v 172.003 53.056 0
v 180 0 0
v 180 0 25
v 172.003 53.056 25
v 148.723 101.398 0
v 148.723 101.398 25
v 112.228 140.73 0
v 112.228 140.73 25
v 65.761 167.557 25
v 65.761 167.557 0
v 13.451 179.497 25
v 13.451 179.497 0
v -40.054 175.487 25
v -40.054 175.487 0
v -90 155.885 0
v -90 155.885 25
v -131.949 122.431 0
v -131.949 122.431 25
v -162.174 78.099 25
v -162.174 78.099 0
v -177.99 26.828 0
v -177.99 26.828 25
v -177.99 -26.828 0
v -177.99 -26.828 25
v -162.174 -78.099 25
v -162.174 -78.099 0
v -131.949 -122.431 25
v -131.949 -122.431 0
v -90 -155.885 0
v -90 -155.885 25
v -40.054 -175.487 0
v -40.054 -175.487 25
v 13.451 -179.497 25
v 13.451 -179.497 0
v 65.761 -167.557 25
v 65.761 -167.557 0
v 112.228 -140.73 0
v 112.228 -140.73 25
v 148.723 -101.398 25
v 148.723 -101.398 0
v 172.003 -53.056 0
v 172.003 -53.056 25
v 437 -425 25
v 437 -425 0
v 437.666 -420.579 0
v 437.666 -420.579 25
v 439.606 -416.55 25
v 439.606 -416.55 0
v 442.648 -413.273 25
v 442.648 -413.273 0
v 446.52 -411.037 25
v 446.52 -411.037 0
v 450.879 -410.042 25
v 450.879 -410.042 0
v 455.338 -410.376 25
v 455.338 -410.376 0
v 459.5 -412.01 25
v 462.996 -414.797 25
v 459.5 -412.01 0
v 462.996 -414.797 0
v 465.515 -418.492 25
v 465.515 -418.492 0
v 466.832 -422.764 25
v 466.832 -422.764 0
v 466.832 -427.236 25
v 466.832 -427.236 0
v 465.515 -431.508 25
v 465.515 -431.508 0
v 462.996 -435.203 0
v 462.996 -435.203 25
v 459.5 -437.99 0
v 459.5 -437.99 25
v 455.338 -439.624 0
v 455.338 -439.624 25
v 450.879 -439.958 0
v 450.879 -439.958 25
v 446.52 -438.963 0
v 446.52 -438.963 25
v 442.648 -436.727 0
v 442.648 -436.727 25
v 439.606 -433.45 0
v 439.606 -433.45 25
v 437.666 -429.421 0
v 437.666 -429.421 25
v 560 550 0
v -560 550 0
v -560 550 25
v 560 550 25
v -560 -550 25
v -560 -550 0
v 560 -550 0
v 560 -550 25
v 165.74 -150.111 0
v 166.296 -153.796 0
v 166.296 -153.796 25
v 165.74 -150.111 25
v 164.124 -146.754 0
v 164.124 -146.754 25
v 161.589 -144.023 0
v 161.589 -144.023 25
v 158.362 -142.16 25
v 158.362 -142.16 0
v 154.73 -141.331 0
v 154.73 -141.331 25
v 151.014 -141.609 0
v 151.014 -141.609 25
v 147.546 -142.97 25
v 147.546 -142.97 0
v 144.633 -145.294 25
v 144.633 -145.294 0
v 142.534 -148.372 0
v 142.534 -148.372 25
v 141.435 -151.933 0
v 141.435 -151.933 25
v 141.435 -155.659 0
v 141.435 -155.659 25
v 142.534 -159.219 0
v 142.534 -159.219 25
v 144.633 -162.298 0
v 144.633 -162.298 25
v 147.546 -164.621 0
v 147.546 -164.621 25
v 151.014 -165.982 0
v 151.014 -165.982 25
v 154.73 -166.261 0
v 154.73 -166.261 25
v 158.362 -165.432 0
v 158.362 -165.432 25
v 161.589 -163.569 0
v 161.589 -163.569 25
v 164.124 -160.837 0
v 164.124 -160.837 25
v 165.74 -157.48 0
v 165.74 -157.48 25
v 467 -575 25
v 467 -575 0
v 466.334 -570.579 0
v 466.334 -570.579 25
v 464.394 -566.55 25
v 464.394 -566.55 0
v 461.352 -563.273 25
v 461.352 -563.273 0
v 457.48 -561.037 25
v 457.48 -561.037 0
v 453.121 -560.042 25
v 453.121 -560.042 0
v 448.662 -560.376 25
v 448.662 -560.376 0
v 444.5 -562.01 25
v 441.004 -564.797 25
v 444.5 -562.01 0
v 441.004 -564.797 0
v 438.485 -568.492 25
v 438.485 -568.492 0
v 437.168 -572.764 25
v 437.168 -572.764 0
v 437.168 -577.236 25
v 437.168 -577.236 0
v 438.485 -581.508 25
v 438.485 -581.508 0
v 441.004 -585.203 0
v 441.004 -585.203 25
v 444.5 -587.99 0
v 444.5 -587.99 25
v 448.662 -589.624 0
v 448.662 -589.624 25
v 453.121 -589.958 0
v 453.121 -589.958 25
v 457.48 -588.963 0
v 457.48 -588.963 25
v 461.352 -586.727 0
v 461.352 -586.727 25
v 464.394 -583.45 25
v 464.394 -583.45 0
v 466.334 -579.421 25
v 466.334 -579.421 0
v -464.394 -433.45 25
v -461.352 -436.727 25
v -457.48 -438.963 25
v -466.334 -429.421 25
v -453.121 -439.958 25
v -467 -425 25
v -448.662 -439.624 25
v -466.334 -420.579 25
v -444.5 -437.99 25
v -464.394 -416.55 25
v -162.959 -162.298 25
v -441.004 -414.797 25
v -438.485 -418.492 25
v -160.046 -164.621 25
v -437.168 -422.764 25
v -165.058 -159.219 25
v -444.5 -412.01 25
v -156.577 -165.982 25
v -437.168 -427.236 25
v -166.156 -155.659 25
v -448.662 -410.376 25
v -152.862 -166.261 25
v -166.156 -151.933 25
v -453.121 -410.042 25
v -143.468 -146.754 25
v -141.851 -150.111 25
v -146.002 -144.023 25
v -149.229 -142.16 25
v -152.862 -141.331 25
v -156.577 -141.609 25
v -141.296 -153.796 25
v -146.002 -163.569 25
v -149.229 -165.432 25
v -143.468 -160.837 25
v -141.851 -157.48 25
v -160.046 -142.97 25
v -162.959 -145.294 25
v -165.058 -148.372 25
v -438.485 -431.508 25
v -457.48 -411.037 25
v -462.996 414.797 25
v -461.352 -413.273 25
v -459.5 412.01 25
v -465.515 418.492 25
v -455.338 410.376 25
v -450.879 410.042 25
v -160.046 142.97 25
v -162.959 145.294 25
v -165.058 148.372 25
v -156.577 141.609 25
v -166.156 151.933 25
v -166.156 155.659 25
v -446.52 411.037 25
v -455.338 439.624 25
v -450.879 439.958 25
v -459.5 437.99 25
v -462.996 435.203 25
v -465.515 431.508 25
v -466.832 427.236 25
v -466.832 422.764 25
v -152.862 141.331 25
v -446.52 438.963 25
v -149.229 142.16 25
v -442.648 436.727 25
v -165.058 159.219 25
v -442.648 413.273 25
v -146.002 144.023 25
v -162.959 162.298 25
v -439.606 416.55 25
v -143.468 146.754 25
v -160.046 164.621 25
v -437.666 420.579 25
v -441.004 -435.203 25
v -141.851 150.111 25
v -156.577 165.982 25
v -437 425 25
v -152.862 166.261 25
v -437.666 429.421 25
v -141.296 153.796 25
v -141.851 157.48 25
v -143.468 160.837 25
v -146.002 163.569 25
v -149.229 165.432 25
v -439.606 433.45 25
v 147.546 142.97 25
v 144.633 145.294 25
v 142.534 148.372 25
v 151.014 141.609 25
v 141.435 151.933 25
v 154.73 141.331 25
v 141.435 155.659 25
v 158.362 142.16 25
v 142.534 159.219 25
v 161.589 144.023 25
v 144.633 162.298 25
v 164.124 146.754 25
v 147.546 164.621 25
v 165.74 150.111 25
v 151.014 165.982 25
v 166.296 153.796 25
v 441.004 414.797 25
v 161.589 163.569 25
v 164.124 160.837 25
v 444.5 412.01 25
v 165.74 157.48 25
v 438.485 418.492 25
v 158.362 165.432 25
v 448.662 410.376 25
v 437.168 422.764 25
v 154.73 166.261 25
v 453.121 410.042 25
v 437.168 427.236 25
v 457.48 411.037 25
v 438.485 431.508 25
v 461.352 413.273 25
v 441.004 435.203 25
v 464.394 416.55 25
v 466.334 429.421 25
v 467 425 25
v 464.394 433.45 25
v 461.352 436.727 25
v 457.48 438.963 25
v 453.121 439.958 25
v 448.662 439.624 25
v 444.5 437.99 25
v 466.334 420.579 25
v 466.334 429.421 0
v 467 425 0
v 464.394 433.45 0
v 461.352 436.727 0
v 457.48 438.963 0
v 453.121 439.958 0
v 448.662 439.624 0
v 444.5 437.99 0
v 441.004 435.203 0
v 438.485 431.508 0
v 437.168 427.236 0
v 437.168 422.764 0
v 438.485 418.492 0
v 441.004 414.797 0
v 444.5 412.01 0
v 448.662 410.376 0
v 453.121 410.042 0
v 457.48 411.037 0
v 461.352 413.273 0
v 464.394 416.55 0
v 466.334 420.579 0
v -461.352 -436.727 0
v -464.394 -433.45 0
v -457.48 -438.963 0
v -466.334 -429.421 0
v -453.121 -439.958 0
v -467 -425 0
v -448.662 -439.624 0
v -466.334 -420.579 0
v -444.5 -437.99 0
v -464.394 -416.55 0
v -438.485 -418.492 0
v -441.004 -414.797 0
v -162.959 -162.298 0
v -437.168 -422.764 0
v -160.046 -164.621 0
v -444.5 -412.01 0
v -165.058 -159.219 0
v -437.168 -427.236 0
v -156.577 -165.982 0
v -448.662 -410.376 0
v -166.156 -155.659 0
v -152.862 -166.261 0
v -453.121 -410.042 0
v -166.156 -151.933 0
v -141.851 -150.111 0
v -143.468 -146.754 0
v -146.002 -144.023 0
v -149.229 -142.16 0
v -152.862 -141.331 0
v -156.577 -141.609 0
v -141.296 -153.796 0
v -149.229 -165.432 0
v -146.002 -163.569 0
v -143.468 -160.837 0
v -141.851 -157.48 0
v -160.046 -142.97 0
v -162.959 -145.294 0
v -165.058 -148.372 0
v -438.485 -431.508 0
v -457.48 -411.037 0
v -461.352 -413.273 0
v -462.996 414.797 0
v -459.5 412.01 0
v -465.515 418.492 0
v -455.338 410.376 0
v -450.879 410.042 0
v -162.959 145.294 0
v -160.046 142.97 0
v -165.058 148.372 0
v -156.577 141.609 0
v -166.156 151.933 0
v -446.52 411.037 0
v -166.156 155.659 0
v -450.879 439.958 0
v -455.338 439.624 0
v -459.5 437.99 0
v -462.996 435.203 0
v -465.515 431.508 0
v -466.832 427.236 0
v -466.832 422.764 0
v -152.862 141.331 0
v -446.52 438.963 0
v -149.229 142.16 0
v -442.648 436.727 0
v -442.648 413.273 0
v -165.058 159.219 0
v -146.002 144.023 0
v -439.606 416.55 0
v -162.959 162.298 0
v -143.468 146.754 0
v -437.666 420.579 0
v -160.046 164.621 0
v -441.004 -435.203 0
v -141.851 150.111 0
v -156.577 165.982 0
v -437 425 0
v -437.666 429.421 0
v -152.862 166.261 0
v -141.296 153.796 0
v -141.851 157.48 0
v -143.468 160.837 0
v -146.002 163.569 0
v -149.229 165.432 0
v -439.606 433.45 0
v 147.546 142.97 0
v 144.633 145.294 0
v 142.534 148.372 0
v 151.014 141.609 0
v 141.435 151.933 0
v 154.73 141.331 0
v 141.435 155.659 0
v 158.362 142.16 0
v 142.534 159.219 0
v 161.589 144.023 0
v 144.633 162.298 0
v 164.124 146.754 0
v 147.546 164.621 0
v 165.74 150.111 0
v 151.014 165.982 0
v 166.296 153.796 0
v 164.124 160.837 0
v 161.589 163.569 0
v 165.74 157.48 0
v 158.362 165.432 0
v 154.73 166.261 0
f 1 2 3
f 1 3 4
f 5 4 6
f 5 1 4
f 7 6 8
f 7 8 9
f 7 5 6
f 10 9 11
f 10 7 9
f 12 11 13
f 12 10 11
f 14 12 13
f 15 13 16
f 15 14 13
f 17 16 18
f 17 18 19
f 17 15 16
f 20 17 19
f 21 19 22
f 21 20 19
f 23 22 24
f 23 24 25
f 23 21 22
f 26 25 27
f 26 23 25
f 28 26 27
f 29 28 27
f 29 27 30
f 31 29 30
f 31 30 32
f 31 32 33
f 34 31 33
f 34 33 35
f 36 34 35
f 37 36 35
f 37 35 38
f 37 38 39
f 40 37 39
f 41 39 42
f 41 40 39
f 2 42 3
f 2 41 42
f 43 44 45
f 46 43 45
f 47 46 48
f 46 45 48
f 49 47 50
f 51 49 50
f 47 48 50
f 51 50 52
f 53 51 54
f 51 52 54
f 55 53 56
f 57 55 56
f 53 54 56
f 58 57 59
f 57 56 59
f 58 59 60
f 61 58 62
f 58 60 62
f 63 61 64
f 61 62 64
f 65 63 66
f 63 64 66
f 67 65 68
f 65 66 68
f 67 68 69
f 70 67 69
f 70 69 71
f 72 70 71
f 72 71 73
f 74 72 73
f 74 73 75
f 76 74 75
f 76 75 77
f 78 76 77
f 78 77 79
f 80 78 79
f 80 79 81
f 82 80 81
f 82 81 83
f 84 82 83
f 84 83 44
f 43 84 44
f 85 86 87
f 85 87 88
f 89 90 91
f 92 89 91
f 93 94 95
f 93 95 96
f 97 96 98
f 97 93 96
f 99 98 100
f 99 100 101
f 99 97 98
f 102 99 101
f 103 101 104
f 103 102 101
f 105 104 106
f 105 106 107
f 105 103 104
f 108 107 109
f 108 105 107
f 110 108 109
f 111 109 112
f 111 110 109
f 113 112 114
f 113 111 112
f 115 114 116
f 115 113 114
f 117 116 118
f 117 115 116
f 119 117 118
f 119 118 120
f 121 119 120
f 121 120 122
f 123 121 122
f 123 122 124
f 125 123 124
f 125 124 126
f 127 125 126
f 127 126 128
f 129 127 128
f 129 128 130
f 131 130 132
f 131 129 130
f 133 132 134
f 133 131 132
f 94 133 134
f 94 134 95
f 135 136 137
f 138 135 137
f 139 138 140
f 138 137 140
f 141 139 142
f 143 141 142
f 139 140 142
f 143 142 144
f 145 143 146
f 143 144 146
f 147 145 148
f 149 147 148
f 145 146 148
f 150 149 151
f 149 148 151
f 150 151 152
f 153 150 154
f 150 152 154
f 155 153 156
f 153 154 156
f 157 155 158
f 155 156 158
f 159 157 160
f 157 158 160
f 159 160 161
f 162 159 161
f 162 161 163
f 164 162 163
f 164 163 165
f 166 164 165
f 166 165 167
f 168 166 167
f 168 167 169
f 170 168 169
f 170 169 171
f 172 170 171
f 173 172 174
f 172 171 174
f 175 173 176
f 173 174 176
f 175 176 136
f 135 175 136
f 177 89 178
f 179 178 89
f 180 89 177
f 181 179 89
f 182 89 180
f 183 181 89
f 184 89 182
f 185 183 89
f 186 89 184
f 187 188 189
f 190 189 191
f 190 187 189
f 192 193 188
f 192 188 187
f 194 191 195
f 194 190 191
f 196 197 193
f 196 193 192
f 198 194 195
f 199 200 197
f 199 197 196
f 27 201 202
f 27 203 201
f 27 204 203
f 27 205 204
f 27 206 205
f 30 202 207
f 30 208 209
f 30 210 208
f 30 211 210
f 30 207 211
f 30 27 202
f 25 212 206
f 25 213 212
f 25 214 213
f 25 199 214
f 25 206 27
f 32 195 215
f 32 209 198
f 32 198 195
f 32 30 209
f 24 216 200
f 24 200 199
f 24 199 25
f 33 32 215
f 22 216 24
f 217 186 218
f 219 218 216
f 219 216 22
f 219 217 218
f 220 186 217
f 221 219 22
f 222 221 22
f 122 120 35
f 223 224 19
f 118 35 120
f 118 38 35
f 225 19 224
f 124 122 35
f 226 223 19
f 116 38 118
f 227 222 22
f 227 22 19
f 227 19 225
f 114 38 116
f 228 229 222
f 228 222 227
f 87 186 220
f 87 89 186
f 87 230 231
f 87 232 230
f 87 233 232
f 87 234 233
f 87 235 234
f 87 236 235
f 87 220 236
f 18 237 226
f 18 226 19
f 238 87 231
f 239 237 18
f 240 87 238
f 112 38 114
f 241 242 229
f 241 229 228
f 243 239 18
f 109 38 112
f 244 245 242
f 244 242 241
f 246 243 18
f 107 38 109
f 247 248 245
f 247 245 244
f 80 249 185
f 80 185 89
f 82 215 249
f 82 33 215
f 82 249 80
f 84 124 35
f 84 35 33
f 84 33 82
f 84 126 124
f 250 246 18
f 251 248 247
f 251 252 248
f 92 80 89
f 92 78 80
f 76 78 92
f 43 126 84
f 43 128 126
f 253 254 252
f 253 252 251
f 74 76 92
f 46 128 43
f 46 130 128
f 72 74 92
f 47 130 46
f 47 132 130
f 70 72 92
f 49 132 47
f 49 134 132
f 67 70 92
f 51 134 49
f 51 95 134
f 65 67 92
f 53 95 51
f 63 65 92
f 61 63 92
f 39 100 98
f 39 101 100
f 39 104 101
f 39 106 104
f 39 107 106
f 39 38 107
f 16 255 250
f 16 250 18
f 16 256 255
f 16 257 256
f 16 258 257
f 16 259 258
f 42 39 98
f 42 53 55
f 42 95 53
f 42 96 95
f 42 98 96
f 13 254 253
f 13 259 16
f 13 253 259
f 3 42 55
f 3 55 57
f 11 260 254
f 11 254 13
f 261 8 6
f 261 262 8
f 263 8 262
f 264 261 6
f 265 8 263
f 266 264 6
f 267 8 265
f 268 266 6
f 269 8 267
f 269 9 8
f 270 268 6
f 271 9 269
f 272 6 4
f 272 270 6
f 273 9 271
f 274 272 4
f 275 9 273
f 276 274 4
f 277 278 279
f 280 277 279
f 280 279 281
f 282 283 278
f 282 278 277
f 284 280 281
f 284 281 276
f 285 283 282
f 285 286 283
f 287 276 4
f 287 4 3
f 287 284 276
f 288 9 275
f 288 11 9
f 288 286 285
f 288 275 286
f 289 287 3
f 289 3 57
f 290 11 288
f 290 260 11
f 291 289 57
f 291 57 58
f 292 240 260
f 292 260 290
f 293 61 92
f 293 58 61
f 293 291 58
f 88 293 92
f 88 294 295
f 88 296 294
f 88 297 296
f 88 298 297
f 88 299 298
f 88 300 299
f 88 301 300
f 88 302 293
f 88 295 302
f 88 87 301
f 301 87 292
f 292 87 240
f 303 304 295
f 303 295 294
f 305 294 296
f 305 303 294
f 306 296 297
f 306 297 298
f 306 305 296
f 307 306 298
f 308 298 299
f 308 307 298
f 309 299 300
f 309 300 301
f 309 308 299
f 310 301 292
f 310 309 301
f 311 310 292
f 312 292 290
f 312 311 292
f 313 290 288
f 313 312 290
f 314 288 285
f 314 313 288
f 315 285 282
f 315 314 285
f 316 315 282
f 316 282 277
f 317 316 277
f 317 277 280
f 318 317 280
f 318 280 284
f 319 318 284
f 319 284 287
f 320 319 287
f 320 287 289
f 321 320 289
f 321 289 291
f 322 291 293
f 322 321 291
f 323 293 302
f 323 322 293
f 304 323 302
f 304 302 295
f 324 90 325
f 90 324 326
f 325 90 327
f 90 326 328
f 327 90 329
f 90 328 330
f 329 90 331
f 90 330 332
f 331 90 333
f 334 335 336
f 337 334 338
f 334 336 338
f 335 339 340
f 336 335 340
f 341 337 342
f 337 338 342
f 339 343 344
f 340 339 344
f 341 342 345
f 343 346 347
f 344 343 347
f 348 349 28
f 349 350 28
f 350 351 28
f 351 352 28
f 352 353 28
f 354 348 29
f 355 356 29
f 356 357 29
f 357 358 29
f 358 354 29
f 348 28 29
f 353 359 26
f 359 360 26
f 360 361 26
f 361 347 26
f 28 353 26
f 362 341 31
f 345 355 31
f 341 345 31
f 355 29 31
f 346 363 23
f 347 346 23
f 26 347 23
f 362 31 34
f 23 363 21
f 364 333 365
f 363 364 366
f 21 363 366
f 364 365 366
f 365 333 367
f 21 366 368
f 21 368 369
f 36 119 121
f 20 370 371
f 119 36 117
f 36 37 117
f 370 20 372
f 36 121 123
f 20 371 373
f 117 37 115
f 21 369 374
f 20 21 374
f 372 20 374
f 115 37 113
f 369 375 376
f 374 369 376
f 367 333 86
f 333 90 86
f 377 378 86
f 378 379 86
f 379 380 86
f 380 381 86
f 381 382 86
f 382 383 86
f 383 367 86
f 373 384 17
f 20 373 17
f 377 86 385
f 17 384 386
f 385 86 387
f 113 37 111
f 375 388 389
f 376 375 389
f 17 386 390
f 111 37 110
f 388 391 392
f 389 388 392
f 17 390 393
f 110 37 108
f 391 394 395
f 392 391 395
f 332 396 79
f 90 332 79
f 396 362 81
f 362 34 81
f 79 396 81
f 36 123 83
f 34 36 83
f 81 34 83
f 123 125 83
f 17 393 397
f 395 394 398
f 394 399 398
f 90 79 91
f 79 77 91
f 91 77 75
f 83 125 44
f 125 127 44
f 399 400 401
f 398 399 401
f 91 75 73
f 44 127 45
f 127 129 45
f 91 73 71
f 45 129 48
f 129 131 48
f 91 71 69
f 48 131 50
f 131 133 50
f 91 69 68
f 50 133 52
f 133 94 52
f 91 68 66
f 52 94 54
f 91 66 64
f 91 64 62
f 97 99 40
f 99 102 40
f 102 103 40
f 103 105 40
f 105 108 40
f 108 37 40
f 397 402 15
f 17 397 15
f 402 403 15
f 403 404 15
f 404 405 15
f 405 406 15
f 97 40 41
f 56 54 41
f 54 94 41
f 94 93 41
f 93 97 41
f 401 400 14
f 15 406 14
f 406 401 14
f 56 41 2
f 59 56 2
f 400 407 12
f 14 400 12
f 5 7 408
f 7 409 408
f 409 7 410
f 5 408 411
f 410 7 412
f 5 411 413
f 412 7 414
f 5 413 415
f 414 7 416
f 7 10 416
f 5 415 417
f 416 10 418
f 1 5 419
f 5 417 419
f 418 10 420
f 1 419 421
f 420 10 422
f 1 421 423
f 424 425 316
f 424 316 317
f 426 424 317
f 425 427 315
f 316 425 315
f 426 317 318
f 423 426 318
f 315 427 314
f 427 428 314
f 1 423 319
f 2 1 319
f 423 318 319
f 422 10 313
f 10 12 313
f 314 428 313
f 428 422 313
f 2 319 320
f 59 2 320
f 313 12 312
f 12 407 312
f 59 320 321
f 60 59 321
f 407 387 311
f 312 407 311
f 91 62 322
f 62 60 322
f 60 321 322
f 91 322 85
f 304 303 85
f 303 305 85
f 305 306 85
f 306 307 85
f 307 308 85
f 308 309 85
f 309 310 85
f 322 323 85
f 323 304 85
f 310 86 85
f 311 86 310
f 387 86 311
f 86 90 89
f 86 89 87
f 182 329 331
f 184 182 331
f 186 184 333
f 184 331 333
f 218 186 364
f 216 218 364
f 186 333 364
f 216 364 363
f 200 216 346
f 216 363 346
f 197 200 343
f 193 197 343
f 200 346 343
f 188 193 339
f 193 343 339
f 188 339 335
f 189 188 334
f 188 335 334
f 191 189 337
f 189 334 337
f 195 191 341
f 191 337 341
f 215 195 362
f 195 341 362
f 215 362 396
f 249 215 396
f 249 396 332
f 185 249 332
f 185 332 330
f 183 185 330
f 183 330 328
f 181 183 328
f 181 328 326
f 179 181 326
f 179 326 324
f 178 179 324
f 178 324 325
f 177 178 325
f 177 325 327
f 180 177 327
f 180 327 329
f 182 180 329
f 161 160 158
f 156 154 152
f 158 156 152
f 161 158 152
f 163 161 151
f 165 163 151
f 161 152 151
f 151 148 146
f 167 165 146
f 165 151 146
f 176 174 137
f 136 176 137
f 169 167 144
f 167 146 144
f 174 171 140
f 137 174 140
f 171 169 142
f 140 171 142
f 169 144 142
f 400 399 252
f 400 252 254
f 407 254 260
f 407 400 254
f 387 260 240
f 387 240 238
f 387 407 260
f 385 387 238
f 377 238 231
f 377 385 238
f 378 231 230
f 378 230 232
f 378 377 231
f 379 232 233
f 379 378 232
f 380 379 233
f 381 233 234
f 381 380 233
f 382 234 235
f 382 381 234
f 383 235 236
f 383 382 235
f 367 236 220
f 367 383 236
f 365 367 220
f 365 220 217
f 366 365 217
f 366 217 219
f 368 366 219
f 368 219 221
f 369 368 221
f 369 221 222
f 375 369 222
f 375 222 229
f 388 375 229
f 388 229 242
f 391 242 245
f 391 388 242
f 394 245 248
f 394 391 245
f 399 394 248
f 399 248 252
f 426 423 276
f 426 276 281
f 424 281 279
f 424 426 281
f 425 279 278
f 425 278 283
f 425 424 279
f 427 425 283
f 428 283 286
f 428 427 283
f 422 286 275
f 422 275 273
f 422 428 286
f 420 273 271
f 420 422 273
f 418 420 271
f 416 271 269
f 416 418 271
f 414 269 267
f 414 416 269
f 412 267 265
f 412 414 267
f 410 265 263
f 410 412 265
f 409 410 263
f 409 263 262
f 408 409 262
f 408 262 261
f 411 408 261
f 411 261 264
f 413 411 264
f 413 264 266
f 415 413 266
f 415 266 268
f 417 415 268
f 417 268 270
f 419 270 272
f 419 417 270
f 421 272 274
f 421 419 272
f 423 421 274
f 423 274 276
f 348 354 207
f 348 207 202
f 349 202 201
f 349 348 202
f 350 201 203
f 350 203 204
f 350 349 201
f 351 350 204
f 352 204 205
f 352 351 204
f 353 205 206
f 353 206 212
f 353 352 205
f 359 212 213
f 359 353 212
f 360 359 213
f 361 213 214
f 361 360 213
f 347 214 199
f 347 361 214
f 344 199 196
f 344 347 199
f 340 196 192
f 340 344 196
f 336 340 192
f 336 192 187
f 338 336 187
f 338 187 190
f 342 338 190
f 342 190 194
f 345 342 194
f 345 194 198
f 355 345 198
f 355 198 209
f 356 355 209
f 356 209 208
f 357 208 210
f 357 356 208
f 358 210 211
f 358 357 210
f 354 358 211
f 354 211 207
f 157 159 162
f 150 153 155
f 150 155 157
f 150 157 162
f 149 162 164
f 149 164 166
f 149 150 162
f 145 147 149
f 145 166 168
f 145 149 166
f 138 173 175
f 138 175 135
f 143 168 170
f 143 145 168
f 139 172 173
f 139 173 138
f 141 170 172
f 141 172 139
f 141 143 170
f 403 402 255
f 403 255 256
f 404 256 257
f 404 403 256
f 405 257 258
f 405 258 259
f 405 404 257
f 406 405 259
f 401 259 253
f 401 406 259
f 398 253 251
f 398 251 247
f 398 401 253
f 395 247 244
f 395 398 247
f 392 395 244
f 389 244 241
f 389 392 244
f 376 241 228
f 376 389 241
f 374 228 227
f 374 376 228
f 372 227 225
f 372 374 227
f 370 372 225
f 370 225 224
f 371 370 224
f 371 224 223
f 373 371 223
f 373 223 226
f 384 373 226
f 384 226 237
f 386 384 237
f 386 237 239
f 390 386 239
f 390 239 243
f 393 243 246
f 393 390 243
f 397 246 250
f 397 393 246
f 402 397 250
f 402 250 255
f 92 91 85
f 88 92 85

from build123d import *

# Parameters (mm, degrees)
SKETCH_1_R          = 15
EXTRUDE_1_DEPTH     = 25
SKETCH_1_W          = 1120
SKETCH_1_H          = 1100
SKETCH_1_R_2        = 180
SKETCH_1_R_3        = 12.5
EXTRUDE_1_2_DEPTH   = 25
SKETCH_2_R          = 15
CUT_EXTRUDE_1_DEPTH = 814.833521059
SKETCH_4_R          = 15
CUT_EXTRUDE_2_DEPTH = 814.833521059


with BuildPart() as part:
    # 草图1 → 凸台-拉伸1 (new body)
    with BuildSketch(Plane.XY):
        with Locations((452, -575)):
            Circle(SKETCH_1_R)
    extrude(amount=EXTRUDE_1_DEPTH)


with BuildPart() as body_2:
    # 草图1 → Extrude 1 2 (new body)
    with BuildSketch(Plane.XY):
        Rectangle(SKETCH_1_W, SKETCH_1_H)
        with Locations((-452, 425)):
            Circle(SKETCH_1_R, mode=Mode.SUBTRACT)
        Circle(SKETCH_1_R_2, mode=Mode.SUBTRACT)
        with Locations((153.795724908, -153.795724908)):
            Circle(SKETCH_1_R_3, mode=Mode.SUBTRACT)
        with Locations((-153.795724908, -153.795724908)):
            Circle(SKETCH_1_R_3, mode=Mode.SUBTRACT)
        with Locations((-153.795724908, 153.795724908)):
            Circle(SKETCH_1_R_3, mode=Mode.SUBTRACT)
        with Locations((153.795724908, 153.795724908)):
            Circle(SKETCH_1_R_3, mode=Mode.SUBTRACT)
        with Locations((452, 425)):
            Circle(SKETCH_1_R, mode=Mode.SUBTRACT)
    extrude(amount=EXTRUDE_1_2_DEPTH)

    # 草图2 → 切除-拉伸1 (cut, through all)
    with BuildSketch(Plane(origin=(0, 0, 0), x_dir=(-1, 0, 0), z_dir=(0, 0, -1))):
        with Locations((452, -425)):
            Circle(SKETCH_2_R)
    extrude(amount=-CUT_EXTRUDE_1_DEPTH, mode=Mode.SUBTRACT)

    # 草图4 → 切除-拉伸2 (cut, through all)
    with BuildSketch(Plane(origin=(0, 0, 0), x_dir=(-1, 0, 0), z_dir=(0, 0, -1))):
        with Locations((-452, -425)):
            Circle(SKETCH_4_R)
    extrude(amount=-CUT_EXTRUDE_2_DEPTH, mode=Mode.SUBTRACT)


solid = Compound([part.part, body_2.part])
